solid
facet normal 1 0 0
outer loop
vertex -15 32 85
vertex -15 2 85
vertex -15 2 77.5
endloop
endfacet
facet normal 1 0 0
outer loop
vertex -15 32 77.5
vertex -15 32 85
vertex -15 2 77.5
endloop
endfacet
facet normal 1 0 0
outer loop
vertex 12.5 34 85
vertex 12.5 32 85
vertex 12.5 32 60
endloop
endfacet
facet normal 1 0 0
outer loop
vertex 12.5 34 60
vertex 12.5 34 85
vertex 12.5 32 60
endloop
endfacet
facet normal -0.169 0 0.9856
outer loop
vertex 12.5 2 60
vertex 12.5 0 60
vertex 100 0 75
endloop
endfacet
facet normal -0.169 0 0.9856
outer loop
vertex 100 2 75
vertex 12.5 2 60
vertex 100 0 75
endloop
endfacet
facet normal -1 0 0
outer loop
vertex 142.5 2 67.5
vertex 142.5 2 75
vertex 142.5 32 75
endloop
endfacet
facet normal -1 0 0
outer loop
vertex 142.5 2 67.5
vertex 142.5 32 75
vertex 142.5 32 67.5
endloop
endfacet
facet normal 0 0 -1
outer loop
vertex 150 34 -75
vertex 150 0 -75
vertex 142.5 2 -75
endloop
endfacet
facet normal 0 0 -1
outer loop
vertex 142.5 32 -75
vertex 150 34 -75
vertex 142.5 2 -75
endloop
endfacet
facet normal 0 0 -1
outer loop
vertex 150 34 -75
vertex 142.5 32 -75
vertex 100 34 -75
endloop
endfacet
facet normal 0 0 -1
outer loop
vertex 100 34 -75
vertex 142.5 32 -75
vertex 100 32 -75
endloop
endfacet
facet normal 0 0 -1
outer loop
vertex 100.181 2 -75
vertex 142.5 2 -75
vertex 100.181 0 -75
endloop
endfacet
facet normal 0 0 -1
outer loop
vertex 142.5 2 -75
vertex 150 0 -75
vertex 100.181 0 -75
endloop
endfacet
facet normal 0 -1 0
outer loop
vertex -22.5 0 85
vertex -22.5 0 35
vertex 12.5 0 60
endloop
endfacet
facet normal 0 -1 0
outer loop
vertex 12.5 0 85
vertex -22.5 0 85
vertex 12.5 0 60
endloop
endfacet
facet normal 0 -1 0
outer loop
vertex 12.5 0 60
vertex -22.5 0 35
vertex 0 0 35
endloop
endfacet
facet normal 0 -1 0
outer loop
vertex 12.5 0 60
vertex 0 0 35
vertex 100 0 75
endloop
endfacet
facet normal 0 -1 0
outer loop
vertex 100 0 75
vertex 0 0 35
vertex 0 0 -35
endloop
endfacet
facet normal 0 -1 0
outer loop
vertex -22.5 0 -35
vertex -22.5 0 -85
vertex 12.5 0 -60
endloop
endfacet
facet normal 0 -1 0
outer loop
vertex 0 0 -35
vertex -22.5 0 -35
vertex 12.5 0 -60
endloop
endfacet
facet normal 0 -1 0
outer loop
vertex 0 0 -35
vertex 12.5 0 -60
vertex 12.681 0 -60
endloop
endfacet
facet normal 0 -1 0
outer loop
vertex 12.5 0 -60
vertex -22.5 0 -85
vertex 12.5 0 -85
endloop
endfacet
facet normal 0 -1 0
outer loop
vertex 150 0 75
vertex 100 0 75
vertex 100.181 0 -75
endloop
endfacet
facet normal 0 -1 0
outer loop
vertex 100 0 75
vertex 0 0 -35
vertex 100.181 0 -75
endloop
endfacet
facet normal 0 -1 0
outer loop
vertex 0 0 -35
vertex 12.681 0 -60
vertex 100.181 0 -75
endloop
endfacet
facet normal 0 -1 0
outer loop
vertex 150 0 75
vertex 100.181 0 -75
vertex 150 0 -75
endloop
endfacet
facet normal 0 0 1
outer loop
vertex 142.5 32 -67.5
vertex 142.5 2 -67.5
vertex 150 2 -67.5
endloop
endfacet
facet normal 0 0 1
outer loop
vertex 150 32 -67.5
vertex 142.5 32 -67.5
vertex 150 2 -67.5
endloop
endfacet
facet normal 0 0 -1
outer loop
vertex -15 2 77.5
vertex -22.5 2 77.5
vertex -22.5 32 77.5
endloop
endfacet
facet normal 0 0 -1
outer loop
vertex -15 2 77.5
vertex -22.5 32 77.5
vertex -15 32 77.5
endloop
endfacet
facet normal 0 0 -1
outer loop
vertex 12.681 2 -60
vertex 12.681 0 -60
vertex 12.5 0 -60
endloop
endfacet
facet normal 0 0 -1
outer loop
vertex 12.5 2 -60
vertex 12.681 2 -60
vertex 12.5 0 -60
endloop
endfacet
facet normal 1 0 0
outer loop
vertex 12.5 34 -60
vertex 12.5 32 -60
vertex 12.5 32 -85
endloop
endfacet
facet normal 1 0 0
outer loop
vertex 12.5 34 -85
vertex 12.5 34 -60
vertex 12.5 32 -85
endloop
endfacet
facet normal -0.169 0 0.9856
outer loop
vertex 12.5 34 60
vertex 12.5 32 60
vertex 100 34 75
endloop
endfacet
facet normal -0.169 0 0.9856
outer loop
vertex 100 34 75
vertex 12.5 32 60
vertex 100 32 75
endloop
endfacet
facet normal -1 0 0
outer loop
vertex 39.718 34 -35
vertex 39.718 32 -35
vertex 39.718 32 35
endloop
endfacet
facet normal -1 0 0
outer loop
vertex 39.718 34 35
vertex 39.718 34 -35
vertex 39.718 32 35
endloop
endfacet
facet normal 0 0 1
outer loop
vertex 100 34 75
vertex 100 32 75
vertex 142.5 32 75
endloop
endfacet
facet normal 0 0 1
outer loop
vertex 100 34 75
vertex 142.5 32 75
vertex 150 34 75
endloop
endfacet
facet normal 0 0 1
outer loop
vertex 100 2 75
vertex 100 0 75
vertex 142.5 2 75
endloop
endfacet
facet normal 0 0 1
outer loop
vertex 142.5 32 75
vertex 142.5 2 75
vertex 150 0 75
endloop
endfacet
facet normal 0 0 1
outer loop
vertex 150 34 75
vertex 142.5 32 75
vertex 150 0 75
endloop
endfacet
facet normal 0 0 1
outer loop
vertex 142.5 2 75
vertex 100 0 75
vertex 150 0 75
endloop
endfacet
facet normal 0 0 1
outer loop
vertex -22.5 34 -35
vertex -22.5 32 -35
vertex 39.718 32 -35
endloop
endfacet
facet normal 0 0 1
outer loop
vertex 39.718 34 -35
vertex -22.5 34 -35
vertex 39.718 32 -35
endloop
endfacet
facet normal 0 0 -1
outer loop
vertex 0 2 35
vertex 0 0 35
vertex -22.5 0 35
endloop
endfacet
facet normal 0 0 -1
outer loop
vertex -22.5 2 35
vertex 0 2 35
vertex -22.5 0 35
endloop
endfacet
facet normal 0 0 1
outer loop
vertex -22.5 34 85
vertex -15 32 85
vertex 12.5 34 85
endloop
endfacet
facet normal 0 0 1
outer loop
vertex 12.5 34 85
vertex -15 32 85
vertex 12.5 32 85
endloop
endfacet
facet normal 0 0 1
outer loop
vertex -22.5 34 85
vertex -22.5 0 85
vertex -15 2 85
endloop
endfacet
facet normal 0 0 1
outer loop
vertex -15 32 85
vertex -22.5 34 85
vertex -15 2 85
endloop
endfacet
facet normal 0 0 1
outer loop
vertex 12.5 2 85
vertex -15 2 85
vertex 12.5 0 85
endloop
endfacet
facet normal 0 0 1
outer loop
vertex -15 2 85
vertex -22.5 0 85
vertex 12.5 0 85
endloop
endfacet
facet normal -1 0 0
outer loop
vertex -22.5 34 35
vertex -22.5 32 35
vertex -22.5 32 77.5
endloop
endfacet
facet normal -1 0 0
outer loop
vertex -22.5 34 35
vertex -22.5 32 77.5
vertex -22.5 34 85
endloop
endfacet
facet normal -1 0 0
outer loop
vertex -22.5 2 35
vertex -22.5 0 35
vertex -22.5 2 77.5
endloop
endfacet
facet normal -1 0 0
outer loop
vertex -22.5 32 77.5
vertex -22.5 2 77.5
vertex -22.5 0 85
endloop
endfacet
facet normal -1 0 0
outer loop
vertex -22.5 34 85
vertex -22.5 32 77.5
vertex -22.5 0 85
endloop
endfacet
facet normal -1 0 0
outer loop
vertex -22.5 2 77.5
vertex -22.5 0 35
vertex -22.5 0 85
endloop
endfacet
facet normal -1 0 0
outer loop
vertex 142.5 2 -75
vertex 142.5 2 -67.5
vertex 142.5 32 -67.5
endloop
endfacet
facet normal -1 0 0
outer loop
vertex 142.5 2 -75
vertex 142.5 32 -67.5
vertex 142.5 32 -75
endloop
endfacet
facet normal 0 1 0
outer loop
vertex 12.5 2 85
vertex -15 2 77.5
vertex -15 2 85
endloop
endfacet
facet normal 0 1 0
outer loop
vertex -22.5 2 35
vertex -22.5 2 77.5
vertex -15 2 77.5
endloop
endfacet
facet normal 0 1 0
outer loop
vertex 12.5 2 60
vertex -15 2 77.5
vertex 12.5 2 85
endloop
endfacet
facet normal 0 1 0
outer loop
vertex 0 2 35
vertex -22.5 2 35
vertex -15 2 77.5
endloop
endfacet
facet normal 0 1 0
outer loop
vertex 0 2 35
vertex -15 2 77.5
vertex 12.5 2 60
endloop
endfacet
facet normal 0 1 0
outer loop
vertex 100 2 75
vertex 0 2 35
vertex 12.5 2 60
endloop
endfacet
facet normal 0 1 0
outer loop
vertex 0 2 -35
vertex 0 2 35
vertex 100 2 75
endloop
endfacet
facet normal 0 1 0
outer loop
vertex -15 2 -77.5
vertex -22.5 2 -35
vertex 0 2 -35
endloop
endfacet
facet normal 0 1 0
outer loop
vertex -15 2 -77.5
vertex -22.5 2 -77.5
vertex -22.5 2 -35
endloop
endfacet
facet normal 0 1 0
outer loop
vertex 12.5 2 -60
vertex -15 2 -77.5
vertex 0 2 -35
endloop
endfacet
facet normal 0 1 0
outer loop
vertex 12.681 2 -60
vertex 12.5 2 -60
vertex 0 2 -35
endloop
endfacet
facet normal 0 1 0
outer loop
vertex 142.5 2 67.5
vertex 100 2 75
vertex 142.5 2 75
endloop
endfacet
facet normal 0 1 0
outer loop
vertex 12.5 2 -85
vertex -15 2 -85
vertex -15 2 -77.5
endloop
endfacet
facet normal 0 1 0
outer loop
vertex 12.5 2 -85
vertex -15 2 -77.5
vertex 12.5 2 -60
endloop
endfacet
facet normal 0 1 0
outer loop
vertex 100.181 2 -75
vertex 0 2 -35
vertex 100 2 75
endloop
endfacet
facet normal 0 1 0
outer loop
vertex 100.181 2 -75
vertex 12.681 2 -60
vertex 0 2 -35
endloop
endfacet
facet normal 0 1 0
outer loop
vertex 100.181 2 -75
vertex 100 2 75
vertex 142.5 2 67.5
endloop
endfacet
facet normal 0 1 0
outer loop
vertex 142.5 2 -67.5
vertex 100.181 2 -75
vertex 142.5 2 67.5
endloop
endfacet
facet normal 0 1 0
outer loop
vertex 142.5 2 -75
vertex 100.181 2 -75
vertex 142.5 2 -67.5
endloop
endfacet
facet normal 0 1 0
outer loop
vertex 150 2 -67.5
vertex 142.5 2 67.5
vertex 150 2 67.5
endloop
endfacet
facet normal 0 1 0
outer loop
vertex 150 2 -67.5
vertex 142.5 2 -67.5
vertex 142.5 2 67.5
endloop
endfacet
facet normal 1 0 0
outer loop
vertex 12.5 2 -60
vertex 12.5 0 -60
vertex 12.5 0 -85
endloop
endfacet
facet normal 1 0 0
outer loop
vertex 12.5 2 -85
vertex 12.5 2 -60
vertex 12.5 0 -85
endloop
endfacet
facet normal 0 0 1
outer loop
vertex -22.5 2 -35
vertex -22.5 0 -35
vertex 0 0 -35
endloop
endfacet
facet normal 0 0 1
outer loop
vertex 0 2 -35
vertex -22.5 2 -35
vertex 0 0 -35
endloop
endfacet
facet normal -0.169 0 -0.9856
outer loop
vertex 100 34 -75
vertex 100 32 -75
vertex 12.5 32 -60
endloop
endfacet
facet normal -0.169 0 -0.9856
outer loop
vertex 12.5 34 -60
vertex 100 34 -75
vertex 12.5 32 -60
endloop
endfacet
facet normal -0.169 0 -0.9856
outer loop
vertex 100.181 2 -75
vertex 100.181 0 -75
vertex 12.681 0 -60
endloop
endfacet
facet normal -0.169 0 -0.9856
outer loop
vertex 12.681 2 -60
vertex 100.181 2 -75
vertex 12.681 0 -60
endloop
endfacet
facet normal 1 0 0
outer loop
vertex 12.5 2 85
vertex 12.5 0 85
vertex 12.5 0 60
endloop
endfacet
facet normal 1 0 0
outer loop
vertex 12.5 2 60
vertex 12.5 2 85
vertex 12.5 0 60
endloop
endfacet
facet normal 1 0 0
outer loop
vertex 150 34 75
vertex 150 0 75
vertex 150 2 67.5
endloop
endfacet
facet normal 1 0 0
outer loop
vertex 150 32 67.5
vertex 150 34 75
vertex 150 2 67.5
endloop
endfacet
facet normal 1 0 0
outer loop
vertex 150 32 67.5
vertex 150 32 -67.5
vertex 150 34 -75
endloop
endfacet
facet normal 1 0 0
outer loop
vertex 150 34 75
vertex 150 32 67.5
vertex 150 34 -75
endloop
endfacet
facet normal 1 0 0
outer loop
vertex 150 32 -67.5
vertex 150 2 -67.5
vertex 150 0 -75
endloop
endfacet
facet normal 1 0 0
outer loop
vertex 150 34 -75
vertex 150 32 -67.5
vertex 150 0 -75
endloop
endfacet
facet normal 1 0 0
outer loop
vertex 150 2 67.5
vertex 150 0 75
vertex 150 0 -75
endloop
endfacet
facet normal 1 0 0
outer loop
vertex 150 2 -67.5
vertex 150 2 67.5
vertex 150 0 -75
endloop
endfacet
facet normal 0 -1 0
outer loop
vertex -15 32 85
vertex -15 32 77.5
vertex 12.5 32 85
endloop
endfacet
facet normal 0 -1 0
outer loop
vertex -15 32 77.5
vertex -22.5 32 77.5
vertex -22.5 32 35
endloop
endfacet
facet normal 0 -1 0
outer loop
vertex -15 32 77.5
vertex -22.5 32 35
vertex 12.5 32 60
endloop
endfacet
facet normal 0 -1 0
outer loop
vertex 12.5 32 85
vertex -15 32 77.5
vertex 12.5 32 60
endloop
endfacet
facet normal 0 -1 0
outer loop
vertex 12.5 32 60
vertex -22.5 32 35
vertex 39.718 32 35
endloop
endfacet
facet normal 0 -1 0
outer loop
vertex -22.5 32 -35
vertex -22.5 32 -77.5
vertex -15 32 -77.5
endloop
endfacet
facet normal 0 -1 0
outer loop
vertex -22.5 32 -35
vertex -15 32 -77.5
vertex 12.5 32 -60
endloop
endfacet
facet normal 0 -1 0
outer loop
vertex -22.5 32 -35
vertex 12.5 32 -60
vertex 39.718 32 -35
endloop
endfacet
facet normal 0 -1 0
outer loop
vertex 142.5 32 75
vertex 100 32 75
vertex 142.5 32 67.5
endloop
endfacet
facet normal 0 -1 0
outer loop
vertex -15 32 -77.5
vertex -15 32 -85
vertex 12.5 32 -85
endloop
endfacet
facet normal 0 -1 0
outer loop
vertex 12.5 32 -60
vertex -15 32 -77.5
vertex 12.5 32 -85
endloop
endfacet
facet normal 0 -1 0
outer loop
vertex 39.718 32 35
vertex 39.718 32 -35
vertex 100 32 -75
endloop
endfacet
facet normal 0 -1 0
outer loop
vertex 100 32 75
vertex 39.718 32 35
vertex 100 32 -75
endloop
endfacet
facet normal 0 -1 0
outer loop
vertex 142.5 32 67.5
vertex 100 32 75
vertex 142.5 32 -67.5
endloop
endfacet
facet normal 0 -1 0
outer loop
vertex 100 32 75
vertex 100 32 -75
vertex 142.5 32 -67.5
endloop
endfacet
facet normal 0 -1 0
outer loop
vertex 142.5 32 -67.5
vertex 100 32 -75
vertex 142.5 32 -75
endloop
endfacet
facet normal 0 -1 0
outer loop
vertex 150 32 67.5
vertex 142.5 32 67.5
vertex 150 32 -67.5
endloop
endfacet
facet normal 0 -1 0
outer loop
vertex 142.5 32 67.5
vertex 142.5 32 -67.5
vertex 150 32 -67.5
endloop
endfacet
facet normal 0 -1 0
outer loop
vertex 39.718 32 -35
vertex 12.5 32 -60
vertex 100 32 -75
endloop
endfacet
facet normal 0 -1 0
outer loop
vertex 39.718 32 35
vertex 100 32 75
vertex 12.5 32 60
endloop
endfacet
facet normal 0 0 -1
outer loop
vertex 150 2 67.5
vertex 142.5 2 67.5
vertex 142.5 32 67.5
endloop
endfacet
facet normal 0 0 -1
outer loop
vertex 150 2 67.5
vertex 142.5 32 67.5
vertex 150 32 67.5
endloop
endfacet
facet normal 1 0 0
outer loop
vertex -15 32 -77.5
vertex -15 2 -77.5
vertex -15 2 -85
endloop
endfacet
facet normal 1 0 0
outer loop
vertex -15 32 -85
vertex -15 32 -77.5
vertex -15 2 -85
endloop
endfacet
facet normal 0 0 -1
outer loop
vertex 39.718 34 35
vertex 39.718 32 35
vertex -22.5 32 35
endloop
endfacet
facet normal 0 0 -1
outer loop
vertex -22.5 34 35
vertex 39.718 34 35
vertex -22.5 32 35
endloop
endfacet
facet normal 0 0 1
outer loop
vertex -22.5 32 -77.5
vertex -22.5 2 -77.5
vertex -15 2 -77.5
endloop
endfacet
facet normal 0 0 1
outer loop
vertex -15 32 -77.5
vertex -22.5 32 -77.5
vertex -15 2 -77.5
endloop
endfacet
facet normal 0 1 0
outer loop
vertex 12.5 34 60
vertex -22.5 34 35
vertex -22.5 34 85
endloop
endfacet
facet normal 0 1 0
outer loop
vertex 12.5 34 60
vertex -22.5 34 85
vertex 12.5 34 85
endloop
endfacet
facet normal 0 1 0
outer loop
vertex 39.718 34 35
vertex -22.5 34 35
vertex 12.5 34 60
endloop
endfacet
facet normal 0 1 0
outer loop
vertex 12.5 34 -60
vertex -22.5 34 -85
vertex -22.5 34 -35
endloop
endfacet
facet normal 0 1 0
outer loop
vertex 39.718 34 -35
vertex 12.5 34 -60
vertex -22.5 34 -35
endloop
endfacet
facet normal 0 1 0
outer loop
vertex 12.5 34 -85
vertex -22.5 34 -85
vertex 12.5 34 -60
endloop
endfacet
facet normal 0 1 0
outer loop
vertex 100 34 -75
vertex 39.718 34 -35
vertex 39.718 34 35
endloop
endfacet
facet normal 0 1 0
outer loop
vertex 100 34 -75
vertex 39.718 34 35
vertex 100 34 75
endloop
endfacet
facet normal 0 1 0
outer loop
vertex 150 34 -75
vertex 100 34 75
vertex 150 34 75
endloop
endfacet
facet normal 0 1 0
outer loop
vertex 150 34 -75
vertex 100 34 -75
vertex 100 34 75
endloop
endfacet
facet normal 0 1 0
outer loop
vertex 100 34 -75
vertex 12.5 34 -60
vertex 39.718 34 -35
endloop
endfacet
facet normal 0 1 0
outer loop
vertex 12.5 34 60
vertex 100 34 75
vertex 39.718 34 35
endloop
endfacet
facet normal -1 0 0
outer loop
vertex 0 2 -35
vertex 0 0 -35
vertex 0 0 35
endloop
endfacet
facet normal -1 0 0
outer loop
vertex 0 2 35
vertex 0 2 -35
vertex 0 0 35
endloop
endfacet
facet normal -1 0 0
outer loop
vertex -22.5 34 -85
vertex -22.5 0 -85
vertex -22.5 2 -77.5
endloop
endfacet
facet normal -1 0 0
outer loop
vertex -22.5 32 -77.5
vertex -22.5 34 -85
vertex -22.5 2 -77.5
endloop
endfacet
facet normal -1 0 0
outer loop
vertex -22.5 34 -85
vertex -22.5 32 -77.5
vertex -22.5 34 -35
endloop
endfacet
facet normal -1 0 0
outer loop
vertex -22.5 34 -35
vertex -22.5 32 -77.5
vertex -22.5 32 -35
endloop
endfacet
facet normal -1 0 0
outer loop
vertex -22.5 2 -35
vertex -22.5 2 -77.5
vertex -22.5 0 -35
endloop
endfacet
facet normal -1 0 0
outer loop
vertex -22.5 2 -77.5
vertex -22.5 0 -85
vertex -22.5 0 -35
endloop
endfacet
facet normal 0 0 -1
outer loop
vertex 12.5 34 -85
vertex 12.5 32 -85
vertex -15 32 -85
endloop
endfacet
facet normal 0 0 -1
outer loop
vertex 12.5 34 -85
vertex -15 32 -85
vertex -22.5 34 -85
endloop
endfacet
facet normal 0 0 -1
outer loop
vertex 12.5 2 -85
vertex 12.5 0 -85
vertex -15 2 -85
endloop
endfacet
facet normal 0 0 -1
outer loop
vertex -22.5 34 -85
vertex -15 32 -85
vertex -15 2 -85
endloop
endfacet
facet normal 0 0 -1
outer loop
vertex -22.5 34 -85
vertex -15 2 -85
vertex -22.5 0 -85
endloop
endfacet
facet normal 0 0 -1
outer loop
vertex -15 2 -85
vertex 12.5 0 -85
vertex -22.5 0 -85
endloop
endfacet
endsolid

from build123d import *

# Parameters (mm, degrees)
BOSS_EXTRUDE1_DEPTH = 2
SKETCH3_W           = 7.5
SKETCH3_H           = 7.5
BOSS_EXTRUDE2_DEPTH = 30
BOSS_EXTRUDE3_DEPTH = 2


with BuildPart() as part:
    # Sketch2 → Boss-Extrude1 (new body)
    with BuildSketch(Plane(origin=(0, 0, 0), x_dir=(1, 0, 0), z_dir=(0, 1, 0))):
        Polygon((0, 35), (0, -35), (-22.5, -35), (-22.5, -85), (12.5, -85), (12.5, -60), (100, -75), (150, -75), (150, 75), (100.180900235, 75), (12.680900235, 60), (12.5, 60), (12.5, 85), (-22.5, 85), (-22.5, 35), align=None)
    extrude(amount=BOSS_EXTRUDE1_DEPTH)

    # Sketch3 → Boss-Extrude2 (add)
    with BuildSketch(Plane(origin=(0, 2, 0), x_dir=(1, 0, 0), z_dir=(0, 1, 0))):
        with Locations((146.25, 71.25)):
            Rectangle(SKETCH3_W, SKETCH3_H)
        with Locations((146.25, -71.25)):
            Rectangle(SKETCH3_W, SKETCH3_H)
        with Locations((-18.75, 81.25)):
            Rectangle(SKETCH3_W, SKETCH3_H)
        with Locations((-18.75, -81.25)):
            Rectangle(SKETCH3_W, SKETCH3_H)
    extrude(amount=BOSS_EXTRUDE2_DEPTH)

    # Sketch5 → Boss-Extrude3 (add)
    with BuildSketch(Plane(origin=(0, 32, 0), x_dir=(1, 0, 0), z_dir=(0, 1, 0))):
        Polygon((150, 75), (100, 75), (12.5, 60), (12.5, 85), (-22.5, 85), (-22.5, 65), (-22.5, 35), (39.717843368, 35), (39.717843368, -35), (-22.5, -35), (-22.5, -85), (12.5, -85), (12.5, -60), (100, -75), (150, -75), align=None)
    extrude(amount=BOSS_EXTRUDE3_DEPTH)


solid = part.part
